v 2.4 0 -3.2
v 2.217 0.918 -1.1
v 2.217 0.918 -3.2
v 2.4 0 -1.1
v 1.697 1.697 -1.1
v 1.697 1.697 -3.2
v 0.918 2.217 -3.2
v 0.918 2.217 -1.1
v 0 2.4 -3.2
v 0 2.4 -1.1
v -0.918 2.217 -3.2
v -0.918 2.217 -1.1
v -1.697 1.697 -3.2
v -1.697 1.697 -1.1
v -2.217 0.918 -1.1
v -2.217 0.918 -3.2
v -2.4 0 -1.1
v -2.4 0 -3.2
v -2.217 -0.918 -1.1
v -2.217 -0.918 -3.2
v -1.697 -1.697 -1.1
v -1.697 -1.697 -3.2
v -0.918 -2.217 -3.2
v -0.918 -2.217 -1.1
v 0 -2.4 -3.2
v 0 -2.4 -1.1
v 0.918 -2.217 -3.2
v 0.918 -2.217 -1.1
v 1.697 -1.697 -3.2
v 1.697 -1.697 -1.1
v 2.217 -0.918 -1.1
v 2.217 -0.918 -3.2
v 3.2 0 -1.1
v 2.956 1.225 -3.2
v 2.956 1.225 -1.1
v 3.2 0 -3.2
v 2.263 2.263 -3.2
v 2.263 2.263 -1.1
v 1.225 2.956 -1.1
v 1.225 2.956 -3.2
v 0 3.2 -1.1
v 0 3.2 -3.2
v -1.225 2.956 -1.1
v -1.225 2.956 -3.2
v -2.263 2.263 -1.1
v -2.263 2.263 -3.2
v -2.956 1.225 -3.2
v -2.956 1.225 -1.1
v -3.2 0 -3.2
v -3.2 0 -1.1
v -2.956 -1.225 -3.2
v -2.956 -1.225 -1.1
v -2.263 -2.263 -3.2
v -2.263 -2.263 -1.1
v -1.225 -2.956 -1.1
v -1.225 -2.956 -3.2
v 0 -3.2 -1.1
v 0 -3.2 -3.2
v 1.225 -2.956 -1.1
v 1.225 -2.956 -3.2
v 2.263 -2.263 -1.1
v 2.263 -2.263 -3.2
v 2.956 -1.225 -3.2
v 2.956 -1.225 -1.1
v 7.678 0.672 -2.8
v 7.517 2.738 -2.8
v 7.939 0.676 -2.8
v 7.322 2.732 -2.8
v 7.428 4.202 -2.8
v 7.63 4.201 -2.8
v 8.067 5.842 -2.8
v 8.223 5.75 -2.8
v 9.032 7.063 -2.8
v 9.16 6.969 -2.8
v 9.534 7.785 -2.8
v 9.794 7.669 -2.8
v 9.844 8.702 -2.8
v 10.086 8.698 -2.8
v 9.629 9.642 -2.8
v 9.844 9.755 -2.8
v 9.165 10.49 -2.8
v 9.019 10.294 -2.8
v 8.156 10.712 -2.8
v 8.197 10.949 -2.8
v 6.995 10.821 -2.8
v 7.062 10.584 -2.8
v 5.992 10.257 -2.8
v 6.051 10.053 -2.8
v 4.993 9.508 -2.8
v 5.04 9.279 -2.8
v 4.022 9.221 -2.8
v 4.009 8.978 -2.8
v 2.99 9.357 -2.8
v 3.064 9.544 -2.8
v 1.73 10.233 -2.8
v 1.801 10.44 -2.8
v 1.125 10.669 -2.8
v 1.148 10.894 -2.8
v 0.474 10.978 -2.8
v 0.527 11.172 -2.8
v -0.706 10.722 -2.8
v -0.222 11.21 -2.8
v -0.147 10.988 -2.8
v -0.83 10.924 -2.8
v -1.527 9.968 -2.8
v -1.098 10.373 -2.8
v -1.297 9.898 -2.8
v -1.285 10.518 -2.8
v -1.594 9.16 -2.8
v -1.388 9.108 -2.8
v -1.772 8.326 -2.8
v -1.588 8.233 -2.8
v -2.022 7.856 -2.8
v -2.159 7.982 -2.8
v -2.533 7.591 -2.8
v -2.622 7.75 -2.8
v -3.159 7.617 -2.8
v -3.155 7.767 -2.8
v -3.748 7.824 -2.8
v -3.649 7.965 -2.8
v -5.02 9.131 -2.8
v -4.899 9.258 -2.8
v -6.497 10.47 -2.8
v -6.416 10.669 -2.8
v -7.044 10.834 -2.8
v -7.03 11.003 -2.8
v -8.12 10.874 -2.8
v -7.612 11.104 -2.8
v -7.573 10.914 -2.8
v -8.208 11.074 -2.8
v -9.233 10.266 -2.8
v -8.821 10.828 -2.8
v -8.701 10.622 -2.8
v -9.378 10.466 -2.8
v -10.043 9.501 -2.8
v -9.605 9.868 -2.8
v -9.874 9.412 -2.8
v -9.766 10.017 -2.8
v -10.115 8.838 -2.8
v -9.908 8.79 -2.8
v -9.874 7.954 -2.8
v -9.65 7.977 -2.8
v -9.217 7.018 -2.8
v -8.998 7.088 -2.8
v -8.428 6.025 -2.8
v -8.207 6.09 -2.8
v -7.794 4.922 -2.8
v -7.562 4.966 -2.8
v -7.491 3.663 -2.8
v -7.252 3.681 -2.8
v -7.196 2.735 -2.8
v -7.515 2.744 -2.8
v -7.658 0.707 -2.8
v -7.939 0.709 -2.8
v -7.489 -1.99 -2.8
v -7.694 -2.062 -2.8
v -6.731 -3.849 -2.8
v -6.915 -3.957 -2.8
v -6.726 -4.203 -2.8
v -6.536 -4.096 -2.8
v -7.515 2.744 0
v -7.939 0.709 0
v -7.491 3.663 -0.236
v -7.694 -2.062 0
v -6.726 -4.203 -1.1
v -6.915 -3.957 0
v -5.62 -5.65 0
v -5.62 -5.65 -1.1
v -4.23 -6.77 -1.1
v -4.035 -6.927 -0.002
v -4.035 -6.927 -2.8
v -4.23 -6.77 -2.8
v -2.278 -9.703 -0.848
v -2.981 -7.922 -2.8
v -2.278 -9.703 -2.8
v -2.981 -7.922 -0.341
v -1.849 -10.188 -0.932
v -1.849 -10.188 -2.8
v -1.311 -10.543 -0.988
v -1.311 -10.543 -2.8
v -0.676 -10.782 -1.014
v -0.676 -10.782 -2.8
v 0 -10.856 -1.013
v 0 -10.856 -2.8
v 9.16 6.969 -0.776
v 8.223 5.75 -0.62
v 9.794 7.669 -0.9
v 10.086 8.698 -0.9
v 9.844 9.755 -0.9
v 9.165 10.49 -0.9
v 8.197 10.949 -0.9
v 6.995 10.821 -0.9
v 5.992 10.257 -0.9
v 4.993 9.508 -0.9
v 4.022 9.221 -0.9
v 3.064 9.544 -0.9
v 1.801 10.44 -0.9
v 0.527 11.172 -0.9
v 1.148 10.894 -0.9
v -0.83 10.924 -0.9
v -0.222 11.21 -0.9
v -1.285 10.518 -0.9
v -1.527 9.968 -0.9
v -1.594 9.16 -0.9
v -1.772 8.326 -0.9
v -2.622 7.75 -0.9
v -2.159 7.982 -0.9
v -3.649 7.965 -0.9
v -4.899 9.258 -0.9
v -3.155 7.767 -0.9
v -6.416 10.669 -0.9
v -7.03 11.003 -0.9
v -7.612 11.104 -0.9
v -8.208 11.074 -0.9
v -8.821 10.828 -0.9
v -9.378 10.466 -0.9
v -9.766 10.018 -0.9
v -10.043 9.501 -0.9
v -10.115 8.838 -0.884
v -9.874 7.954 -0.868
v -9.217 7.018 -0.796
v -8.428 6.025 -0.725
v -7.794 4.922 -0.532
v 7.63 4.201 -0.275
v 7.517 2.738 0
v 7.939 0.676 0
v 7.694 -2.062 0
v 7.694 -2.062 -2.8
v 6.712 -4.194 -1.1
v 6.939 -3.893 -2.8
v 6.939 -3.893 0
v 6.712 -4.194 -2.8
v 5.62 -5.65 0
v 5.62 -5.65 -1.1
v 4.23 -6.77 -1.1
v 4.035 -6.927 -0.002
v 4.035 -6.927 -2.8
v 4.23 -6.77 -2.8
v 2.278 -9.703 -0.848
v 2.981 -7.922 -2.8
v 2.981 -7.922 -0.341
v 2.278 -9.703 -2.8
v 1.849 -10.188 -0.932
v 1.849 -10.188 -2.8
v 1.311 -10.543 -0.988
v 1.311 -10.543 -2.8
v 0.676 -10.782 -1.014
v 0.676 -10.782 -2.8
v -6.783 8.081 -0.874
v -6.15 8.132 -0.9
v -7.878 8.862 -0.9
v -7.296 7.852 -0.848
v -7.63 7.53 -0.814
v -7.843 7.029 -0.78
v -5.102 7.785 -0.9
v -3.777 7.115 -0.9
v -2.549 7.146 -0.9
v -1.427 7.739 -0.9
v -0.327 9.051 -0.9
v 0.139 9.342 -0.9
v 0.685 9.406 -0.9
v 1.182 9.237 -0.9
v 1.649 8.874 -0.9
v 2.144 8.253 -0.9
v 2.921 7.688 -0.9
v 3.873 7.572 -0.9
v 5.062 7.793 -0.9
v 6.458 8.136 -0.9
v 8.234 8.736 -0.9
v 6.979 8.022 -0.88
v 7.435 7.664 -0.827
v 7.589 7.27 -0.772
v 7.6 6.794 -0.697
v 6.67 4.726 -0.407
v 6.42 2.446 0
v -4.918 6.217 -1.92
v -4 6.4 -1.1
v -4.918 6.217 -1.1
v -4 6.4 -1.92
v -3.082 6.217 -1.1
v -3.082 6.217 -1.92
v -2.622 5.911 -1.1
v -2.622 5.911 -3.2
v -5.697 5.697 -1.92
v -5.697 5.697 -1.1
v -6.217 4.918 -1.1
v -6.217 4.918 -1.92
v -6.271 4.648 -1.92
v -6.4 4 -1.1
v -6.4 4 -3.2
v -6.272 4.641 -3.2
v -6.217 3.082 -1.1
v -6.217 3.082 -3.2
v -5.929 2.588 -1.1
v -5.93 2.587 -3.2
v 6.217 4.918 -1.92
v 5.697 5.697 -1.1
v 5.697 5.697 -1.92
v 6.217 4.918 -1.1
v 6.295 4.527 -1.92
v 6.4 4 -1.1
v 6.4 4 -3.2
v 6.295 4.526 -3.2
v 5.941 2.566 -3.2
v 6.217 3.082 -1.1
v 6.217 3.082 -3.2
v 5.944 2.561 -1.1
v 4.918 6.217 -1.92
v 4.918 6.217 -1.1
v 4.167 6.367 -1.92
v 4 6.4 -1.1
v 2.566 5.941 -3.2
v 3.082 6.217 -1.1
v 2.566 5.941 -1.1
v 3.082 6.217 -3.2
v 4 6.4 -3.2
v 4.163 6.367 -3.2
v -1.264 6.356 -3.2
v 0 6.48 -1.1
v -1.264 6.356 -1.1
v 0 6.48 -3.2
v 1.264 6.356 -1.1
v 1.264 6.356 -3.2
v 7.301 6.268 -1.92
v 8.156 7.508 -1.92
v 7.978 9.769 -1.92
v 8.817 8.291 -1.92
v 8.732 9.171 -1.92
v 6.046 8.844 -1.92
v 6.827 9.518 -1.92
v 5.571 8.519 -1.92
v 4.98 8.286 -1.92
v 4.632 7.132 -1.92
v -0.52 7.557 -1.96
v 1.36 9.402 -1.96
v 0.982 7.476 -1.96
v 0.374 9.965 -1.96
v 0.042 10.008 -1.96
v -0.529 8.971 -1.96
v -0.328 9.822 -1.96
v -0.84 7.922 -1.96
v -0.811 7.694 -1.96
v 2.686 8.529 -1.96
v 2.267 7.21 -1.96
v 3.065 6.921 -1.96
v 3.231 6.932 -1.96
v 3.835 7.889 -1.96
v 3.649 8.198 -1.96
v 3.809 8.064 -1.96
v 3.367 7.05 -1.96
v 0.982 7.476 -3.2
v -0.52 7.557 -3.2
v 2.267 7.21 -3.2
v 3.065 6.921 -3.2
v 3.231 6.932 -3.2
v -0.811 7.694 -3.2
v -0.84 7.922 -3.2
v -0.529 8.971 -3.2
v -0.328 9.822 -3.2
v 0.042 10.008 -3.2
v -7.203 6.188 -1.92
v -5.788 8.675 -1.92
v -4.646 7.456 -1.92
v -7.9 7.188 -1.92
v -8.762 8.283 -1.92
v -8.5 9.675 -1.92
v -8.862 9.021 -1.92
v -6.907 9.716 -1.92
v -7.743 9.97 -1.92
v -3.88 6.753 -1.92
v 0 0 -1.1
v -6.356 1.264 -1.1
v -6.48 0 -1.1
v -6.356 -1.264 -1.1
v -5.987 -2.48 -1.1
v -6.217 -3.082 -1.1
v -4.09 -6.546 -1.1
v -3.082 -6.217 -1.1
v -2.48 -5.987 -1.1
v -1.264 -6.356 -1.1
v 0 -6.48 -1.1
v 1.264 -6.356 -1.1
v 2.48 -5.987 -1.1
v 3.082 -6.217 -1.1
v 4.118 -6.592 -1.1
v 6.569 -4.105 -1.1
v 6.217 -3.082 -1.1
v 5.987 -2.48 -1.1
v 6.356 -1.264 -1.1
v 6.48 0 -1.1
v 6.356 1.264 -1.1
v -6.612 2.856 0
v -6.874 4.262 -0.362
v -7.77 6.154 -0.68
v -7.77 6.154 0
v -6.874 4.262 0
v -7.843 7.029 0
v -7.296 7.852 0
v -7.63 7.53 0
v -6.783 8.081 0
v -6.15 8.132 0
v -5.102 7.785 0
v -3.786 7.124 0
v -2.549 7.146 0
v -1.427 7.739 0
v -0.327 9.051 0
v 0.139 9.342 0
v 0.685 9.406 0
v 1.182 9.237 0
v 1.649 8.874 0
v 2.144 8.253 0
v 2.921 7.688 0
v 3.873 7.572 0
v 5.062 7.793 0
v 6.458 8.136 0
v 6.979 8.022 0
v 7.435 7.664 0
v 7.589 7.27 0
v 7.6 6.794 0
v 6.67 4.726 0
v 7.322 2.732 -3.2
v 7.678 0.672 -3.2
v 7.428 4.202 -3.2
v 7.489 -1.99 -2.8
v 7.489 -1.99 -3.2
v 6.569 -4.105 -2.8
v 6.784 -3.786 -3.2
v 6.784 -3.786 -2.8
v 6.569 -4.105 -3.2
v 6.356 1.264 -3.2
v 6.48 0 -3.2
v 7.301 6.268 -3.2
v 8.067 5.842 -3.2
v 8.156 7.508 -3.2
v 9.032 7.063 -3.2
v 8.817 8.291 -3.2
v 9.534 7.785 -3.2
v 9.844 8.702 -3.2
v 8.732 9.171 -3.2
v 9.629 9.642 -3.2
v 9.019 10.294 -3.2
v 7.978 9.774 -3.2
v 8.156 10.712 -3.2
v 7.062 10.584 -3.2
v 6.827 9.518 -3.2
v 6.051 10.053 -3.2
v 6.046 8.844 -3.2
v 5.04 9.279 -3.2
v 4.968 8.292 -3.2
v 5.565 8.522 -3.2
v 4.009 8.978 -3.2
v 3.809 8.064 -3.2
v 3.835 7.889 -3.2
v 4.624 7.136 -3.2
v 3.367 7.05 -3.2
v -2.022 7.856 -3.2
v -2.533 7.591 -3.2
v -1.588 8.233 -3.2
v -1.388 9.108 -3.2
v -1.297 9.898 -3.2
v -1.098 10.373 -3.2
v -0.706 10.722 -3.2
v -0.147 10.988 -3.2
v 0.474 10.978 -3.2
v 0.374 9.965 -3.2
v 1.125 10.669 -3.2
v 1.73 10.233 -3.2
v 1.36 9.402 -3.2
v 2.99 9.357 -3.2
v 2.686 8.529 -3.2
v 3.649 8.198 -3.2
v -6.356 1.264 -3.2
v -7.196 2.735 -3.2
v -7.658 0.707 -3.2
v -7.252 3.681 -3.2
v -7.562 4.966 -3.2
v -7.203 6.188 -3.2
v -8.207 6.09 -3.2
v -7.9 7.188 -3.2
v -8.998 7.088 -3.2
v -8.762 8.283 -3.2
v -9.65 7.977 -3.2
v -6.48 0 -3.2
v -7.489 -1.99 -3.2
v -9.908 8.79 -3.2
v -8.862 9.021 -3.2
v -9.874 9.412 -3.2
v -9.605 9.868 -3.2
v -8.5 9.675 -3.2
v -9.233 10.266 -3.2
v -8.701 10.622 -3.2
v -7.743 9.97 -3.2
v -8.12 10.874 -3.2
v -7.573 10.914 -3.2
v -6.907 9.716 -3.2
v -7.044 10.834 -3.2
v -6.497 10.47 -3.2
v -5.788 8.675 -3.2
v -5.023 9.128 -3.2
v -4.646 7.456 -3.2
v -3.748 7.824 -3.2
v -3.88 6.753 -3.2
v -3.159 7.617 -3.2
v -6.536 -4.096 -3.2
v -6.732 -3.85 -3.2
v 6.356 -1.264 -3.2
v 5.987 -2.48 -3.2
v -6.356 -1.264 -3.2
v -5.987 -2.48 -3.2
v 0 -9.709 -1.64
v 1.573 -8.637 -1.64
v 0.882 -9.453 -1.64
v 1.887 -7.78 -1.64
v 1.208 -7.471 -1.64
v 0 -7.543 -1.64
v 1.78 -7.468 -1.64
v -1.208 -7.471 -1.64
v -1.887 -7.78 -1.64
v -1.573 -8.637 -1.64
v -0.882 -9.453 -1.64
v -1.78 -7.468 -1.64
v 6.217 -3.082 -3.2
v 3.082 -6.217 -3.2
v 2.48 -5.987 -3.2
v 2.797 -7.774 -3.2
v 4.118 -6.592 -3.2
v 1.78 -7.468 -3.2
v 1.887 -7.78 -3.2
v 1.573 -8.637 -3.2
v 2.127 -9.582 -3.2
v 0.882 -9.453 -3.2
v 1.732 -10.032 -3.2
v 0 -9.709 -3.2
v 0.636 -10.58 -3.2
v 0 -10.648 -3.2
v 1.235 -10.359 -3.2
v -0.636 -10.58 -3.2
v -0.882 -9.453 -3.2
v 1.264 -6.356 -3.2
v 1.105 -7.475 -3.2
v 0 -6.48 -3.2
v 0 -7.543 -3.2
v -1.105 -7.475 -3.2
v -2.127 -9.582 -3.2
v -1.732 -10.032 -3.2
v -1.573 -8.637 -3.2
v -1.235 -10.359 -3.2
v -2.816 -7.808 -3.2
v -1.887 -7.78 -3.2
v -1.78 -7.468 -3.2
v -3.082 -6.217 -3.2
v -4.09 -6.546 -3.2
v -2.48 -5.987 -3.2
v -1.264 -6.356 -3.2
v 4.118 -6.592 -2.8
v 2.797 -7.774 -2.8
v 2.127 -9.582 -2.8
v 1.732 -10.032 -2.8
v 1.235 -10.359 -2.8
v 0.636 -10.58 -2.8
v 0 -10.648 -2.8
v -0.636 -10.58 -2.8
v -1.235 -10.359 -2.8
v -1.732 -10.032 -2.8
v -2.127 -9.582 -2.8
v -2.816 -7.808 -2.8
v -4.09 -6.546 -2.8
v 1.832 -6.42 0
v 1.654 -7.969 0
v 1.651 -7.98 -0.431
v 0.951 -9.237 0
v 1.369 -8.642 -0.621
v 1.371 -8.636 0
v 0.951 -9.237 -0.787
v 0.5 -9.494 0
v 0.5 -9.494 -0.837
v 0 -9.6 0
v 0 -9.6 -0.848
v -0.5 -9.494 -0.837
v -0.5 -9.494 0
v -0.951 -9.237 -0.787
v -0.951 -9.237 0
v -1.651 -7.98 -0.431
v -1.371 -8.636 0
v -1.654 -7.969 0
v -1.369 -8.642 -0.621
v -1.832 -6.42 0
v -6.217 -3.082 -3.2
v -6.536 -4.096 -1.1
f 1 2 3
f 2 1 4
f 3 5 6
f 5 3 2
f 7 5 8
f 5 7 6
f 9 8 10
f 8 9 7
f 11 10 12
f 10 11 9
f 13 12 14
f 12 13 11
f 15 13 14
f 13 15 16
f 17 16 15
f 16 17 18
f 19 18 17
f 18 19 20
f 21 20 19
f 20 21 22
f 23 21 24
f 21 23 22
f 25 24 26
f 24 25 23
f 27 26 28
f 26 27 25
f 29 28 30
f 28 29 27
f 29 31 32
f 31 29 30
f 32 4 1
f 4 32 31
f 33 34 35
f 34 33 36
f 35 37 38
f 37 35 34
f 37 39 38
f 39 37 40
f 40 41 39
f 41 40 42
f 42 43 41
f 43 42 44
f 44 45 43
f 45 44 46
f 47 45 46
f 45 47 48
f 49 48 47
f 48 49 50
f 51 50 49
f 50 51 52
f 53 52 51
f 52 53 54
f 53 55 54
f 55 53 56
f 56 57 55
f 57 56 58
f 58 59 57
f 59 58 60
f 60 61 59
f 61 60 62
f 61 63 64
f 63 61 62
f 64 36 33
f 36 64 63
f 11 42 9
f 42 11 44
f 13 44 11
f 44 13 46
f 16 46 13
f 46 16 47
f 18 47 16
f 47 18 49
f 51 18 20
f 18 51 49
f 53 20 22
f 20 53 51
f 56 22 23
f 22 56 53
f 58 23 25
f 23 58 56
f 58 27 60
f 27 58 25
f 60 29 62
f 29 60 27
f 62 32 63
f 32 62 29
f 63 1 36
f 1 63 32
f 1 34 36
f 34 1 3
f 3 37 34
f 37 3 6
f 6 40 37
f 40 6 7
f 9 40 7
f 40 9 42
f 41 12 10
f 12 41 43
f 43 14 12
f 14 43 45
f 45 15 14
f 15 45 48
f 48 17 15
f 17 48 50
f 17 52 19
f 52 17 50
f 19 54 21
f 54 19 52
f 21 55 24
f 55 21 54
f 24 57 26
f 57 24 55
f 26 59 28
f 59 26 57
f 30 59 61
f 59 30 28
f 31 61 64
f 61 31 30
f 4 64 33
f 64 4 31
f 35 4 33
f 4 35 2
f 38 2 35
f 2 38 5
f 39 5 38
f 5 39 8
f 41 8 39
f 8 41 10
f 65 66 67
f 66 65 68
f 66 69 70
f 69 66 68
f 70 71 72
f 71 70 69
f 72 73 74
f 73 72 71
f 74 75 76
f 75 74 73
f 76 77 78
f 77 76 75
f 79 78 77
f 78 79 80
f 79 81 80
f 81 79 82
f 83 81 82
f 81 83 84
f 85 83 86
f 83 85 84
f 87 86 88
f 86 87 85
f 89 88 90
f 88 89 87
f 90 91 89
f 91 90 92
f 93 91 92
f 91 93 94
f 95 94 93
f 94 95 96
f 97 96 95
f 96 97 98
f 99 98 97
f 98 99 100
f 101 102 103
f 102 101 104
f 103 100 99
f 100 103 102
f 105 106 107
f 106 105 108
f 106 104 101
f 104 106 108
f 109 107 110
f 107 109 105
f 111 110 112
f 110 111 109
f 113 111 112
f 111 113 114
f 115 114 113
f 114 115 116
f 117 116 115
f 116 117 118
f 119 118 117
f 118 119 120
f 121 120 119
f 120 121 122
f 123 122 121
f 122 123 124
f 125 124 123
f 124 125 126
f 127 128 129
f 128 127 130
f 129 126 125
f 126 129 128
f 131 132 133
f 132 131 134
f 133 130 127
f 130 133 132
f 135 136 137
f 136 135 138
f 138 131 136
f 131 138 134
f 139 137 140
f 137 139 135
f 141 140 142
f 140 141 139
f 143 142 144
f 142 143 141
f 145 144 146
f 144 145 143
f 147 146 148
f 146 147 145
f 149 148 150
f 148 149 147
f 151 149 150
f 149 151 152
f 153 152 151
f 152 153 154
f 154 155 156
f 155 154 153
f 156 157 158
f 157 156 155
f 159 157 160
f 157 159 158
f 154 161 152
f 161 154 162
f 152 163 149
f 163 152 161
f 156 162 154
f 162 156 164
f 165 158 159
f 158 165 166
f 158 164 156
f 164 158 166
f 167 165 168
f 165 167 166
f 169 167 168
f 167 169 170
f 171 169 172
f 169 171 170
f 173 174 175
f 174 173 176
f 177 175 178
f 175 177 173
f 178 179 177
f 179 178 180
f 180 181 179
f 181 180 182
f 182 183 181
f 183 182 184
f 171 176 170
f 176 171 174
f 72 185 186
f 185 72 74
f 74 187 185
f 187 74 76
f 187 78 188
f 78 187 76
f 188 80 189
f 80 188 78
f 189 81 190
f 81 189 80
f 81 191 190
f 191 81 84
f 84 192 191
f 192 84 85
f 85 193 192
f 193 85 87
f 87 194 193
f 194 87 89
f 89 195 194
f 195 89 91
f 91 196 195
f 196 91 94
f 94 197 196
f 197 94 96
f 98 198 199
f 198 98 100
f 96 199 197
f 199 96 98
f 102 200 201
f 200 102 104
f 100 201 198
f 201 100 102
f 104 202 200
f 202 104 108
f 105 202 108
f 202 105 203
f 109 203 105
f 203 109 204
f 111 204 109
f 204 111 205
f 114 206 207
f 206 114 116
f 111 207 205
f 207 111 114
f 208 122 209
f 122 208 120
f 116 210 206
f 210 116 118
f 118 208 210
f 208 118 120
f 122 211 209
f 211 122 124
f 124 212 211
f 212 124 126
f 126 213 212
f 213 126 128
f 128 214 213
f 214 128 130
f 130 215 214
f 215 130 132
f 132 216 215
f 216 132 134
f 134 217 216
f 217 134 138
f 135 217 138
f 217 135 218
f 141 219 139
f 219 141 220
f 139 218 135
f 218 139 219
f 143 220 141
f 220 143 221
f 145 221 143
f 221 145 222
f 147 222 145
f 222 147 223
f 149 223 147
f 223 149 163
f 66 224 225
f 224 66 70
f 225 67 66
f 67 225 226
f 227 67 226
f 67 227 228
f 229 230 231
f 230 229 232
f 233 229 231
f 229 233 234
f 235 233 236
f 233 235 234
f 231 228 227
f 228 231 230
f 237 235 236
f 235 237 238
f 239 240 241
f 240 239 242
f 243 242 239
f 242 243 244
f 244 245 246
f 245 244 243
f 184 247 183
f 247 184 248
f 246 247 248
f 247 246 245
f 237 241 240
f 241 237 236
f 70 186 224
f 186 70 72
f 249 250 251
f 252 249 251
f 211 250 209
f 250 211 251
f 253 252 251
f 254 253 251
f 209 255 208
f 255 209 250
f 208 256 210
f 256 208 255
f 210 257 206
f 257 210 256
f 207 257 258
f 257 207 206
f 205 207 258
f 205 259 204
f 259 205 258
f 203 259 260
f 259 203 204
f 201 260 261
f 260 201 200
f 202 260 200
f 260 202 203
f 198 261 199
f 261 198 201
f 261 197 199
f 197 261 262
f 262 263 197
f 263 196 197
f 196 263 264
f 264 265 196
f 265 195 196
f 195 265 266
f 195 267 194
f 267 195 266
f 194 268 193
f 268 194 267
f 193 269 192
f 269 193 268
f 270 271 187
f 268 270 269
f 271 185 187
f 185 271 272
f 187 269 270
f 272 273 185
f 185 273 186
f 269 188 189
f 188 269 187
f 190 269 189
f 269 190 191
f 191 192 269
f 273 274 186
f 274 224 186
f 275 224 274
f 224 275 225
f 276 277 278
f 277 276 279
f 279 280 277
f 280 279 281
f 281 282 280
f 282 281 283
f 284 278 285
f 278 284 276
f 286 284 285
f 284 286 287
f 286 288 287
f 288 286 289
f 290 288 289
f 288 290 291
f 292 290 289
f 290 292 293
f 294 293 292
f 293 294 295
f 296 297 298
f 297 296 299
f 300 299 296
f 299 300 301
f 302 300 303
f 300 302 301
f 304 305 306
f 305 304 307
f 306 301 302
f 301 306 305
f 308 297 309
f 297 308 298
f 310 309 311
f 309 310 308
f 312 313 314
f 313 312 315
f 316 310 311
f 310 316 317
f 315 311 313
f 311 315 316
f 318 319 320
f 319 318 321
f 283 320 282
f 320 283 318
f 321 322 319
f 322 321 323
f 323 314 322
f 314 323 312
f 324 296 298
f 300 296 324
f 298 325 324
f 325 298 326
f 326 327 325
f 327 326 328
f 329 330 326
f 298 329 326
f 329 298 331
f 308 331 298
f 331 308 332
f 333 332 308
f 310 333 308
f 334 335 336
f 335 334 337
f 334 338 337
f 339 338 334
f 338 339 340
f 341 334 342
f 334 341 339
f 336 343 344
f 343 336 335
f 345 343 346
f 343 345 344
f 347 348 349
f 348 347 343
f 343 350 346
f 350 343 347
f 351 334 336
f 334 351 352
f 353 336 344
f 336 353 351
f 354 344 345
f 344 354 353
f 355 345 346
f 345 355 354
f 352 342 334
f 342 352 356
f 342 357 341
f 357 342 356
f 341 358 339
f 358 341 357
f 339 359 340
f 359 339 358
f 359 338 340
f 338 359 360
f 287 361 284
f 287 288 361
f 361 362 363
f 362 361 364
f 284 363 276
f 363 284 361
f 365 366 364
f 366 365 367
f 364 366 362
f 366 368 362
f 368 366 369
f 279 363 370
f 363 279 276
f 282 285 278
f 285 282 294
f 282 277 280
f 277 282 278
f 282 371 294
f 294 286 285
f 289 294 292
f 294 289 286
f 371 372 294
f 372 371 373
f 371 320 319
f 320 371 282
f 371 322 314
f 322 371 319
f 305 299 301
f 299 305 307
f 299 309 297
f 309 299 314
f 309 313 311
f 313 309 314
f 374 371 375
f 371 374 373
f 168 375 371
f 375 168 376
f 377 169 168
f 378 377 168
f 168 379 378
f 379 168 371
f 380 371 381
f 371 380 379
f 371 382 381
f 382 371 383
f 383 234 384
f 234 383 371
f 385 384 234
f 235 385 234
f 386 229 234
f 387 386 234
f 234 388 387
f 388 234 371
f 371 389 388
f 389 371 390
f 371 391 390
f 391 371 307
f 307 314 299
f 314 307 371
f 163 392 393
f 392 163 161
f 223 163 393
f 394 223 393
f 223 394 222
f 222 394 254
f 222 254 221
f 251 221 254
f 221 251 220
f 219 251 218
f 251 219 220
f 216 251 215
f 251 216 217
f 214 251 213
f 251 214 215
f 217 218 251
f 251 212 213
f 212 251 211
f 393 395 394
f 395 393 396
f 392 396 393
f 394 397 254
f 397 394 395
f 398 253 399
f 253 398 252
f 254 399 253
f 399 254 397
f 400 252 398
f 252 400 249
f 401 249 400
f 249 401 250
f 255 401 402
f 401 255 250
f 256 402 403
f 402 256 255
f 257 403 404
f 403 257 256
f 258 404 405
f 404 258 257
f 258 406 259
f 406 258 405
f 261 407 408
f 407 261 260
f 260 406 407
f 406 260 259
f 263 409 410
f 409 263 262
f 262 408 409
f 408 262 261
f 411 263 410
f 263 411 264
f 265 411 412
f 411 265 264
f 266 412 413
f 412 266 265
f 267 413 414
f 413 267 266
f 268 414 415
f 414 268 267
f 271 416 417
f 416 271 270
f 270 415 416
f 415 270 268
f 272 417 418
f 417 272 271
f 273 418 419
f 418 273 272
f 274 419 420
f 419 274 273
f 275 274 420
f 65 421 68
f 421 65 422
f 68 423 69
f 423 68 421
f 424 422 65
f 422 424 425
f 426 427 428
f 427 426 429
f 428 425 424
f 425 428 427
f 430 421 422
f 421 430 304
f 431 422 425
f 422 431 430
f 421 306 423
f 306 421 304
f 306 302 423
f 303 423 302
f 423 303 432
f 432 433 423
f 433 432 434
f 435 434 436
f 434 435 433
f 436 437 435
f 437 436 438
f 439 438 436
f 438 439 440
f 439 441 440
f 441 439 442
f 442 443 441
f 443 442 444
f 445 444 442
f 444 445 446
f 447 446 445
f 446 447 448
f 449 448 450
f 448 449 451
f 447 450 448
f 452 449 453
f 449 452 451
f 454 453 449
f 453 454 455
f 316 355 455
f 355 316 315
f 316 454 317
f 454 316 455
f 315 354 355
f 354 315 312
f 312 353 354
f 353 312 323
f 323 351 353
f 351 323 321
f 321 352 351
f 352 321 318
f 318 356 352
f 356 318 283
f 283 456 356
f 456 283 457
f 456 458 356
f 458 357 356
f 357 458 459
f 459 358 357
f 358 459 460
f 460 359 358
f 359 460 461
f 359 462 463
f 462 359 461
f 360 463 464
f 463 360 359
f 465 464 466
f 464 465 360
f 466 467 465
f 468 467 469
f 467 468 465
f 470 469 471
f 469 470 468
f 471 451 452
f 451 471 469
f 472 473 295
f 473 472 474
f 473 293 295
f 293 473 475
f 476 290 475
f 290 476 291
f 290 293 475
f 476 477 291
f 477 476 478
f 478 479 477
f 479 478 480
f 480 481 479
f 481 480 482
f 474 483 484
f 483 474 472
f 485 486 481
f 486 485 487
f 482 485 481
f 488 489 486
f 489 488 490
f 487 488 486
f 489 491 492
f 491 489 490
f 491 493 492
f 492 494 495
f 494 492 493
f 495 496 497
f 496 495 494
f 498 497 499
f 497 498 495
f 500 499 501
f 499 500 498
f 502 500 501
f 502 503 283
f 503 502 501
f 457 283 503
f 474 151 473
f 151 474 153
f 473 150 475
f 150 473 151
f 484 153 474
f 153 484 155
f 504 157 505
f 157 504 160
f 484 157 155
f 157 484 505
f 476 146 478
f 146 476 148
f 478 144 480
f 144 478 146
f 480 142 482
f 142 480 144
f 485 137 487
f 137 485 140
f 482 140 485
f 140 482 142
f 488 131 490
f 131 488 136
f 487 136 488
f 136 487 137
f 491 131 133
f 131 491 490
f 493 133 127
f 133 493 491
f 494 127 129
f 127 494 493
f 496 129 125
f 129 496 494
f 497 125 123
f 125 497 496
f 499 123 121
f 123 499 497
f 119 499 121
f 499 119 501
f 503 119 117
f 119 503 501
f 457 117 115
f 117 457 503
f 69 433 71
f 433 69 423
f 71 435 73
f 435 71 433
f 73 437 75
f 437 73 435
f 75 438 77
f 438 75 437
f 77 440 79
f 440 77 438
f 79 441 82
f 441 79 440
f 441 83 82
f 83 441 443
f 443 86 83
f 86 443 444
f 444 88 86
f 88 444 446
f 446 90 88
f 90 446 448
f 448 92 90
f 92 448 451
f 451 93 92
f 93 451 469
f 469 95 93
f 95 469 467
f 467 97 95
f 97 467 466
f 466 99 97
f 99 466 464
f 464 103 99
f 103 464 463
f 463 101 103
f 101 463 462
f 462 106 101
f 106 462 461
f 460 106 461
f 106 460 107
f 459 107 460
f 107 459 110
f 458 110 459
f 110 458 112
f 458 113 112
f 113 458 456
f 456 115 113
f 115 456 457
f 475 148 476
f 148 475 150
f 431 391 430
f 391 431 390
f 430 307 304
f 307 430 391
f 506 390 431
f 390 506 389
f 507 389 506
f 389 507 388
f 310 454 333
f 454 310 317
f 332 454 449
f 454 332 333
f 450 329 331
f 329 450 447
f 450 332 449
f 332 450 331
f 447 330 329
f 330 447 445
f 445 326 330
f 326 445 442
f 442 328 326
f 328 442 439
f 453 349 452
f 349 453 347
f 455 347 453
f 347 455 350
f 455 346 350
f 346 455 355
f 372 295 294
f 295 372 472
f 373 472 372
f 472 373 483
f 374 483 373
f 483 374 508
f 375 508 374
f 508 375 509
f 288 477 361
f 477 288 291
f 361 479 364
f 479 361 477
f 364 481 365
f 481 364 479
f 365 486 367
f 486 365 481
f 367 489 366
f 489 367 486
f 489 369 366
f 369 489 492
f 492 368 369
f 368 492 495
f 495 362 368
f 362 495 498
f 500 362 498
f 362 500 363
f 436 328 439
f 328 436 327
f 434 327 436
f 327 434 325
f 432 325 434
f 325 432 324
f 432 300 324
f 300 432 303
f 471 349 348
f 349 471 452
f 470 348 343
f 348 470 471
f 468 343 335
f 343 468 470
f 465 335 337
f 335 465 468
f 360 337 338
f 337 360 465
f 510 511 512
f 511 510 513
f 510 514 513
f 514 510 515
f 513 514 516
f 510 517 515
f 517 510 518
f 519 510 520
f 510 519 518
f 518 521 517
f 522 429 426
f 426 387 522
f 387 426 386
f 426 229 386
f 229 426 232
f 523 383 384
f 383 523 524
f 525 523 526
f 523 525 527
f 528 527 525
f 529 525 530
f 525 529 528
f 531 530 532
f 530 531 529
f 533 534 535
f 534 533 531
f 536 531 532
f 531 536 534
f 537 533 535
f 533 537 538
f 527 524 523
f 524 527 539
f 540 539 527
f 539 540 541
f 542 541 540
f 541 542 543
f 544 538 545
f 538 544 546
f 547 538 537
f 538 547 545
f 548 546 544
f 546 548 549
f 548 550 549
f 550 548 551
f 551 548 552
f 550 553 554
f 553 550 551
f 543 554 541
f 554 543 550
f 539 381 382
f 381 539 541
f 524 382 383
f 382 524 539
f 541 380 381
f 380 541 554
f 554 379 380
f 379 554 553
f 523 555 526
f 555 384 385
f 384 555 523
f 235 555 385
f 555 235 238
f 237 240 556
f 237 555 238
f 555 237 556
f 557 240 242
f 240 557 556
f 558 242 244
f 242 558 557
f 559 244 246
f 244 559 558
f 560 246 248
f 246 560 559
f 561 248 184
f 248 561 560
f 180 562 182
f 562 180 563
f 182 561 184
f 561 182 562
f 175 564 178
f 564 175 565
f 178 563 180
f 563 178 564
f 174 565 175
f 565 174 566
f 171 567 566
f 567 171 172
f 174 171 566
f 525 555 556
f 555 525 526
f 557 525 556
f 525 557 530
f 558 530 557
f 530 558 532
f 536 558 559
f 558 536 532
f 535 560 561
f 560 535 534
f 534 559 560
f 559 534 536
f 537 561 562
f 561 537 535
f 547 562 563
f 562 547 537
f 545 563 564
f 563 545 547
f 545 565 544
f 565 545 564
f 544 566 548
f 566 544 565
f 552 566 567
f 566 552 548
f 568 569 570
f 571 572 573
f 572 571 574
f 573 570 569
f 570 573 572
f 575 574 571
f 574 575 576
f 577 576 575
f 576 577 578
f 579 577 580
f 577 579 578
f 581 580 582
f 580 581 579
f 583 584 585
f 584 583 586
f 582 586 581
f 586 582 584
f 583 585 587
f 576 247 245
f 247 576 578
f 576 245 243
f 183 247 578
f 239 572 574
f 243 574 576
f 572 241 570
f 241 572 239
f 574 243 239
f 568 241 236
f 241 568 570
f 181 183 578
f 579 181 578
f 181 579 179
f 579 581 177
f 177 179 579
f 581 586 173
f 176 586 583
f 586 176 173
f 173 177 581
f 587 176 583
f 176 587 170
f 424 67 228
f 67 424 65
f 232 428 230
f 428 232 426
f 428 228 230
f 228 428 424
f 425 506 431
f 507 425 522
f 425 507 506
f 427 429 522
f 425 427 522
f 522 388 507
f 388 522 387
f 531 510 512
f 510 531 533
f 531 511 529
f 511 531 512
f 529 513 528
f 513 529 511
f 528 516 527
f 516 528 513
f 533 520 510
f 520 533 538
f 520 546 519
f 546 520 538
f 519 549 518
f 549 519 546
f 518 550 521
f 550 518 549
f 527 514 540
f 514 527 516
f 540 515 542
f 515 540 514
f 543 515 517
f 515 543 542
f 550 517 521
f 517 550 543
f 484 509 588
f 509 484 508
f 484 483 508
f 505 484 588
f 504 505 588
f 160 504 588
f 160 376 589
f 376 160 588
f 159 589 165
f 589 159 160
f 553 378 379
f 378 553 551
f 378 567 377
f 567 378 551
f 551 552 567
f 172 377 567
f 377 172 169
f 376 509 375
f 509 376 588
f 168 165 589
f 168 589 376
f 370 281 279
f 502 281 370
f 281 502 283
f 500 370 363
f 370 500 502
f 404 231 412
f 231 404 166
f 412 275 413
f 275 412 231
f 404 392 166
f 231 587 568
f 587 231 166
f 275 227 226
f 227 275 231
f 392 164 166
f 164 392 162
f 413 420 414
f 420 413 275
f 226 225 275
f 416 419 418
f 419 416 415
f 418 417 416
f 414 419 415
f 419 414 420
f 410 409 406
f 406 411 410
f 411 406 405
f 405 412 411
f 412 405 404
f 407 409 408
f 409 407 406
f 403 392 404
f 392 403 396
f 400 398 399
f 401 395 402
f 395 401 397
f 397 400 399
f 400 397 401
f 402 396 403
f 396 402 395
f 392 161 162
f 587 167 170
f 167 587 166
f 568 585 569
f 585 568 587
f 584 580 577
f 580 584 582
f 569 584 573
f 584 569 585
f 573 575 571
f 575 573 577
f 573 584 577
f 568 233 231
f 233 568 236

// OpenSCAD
use <../lib.scad>
use <s/80677s01.scad>
function ldraw_lib__80677() = [
// 0 Tile  2 x  2 Round Splat
// 0 Name: 80677.dat
// 0 Author: Magnus Forsberg [MagFors]
// 0 !LDRAW_ORG Part UPDATE 2025-09
// 0 !LICENSE Licensed under CC BY 4.0 : see CAreadme.txt
// 
// 0 BFC CERTIFY CCW
  [0,"BFC","CERTIFY"],
  [0,"BFC","CCW"],
// 
// 0 !HISTORY 2022-11-20 {LEGO Instructions App} Original part shape
// 0 !HISTORY 2022-11-26 [MagFors] File preparation for LDraw Parts Tracker
// 0 !HISTORY 2025-09-29 [OrionP] Official Update 2025-09
// 
// 1 16 0 0 0 1 0 0 0 1 0 0 0 1 s\80677s01.dat
  [1,16,0,0,0,1,0,0,0,1,0,0,0,1, ldraw_lib__s__80677s01()],
// 0 // center quad
// 4 16 17.347 0 -9.732 7.303 0 19.219 -6.372 0 17.866 -17.287 0 -9.892
  [4,16,17.347,0,-9.732,7.303,0,19.219,-6.372,0,17.866,-17.287,0,-9.892],
// 0 // the best
// 4 16 16.05 0 6.115 9.682 0 18.93 7.303 0 19.219 17.347 0 -9.732
  [4,16,16.05,0,6.115,9.682,0,18.93,7.303,0,19.219,17.347,0,-9.732],
// 3 16 -6.372 0 17.866 -16.53 0 7.139 -17.287 0 -9.892
  [3,16,-6.372,0,17.866,-16.53,0,7.139,-17.287,0,-9.892],
// 4 16 4.579 0 -16.051 17.347 0 -9.732 -17.287 0 -9.892 -4.579 0 -16.051
  [4,16,4.579,0,-16.051,17.347,0,-9.732,-17.287,0,-9.892,-4.579,0,-16.051],
// 4 16 17.347 0 -9.732 19.235 0 -5.155 19.848 0 1.69 16.05 0 6.115
  [4,16,17.347,0,-9.732,19.235,0,-5.155,19.848,0,1.69,16.05,0,6.115],
// 4 16 -17.287 0 -9.892 -16.53 0 7.139 -19.847 0 1.773 -19.235 0 -5.155
  [4,16,-17.287,0,-9.892,-16.53,0,7.139,-19.847,0,1.773,-19.235,0,-5.155],
// 0 // the rest
// 4 16 12.655 0 19.482 9.682 0 18.93 16.05 0 6.115 16.676 0 11.814
  [4,16,12.655,0,19.482,9.682,0,18.93,16.05,0,6.115,16.676,0,11.814],
// 3 16 19.848 0 1.69 18.792 0 6.844 16.05 0 6.115
  [3,16,19.848,0,1.69,18.792,0,6.844,16.05,0,6.115],
// 4 16 17.448 0 20.056 16.146 0 20.34 19 0 16.986 18.973 0 18.175
  [4,16,17.448,0,20.056,16.146,0,20.34,19,0,16.986,18.973,0,18.175],
// 3 16 18.973 0 18.175 18.588 0 19.16 17.448 0 20.056
  [3,16,18.973,0,18.175,18.588,0,19.16,17.448,0,20.056],
// 4 16 16.676 0 11.814 19 0 16.986 16.146 0 20.34 12.655 0 19.482
  [4,16,16.676,0,11.814,19,0,16.986,16.146,0,20.34,12.655,0,19.482],
// 3 16 4.122 0 22.186 2.955 0 23.093 -.817 0 22.627
  [3,16,4.122,0,22.186,2.955,0,23.093,-.817,0,22.627],
// 4 16 5.361 0 20.632 4.122 0 22.186 -.817 0 22.627 -3.568 0 19.348
  [4,16,5.361,0,20.632,4.122,0,22.186,-.817,0,22.627,-3.568,0,19.348],
// 4 16 -3.568 0 19.348 -6.372 0 17.866 7.303 0 19.219 5.361 0 20.632
  [4,16,-3.568,0,19.348,-6.372,0,17.866,7.303,0,19.219,5.361,0,20.632],
// 4 16 1.712 0 23.515 .348 0 23.354 -.817 0 22.627 2.955 0 23.093
  [4,16,1.712,0,23.515,.348,0,23.354,-.817,0,22.627,2.955,0,23.093],
// 4 16 -6.372 0 17.866 -9.464 0 17.809 -17.186 0 10.654 -16.53 0 7.139
  [4,16,-6.372,0,17.866,-9.464,0,17.809,-17.186,0,10.654,-16.53,0,7.139],
// 3 16 -16.958 0 20.202 -18.239 0 19.63 -19.075 0 18.826
  [3,16,-16.958,0,20.202,-18.239,0,19.63,-19.075,0,18.826],
// 4 16 -12.756 0 19.462 -15.375 0 20.329 -19.607 0 17.573 -19.425 0 15.385
  [4,16,-12.756,0,19.462,-15.375,0,20.329,-19.607,0,17.573,-19.425,0,15.385],
// 4 16 -15.375 0 20.329 -16.958 0 20.202 -19.075 0 18.826 -19.607 0 17.573
  [4,16,-15.375,0,20.329,-16.958,0,20.202,-19.075,0,18.826,-19.607,0,17.573],
// 4 16 -9.464 0 17.809 -12.756 0 19.462 -19.425 0 15.385 -17.186 0 10.654
  [4,16,-9.464,0,17.809,-12.756,0,19.462,-19.425,0,15.385,-17.186,0,10.654],
// 3 16 -16.53 0 7.139 -18.787 0 6.859 -19.847 0 1.773
  [3,16,-16.53,0,7.139,-18.787,0,6.859,-19.847,0,1.773],
// 4 16 -17.287 0 -9.892 -14.05 0 -14.124 -10.087 .004 -17.318 -4.579 0 -16.051
  [4,16,-17.287,0,-9.892,-14.05,0,-14.124,-10.087,.004,-17.318,-4.579,0,-16.051],
// 4 16 4.136 0 -19.922 4.579 0 -16.051 -4.579 0 -16.051 -4.136 0 -19.922
  [4,16,4.136,0,-19.922,4.579,0,-16.051,-4.579,0,-16.051,-4.136,0,-19.922],
// 4 16 -2.378 0 -23.092 -1.251 0 -23.734 0 0 -23.999 -3.427 0 -21.59
  [4,16,-2.378,0,-23.092,-1.251,0,-23.734,0,0,-23.999,-3.427,0,-21.59],
// 4 16 4.136 0 -19.922 -4.136 0 -19.922 -3.427 0 -21.59 3.427 0 -21.59
  [4,16,4.136,0,-19.922,-4.136,0,-19.922,-3.427,0,-21.59,3.427,0,-21.59],
// 4 16 0 0 -23.999 1.251 0 -23.734 2.378 0 -23.092 3.427 0 -21.59
  [4,16,0,0,-23.999,1.251,0,-23.734,2.378,0,-23.092,3.427,0,-21.59],
// 3 16 3.427 0 -21.59 -3.427 0 -21.59 0 0 -23.999
  [3,16,3.427,0,-21.59,-3.427,0,-21.59,0,0,-23.999],
// 4 16 10.087 .004 -17.318 14.05 0 -14.124 17.347 0 -9.732 4.579 0 -16.051
  [4,16,10.087,.004,-17.318,14.05,0,-14.124,17.347,0,-9.732,4.579,0,-16.051],
];
module ldraw_lib__80677(step=0, col=false, unit=2/5, alt=false, line=0.2, solid=!$preview)
    makepoly(ldraw_lib__80677(), step=step, col=col, unit=unit, alt=alt, line=line, solid=solid);
ldraw_lib__80677(line=0.2);
